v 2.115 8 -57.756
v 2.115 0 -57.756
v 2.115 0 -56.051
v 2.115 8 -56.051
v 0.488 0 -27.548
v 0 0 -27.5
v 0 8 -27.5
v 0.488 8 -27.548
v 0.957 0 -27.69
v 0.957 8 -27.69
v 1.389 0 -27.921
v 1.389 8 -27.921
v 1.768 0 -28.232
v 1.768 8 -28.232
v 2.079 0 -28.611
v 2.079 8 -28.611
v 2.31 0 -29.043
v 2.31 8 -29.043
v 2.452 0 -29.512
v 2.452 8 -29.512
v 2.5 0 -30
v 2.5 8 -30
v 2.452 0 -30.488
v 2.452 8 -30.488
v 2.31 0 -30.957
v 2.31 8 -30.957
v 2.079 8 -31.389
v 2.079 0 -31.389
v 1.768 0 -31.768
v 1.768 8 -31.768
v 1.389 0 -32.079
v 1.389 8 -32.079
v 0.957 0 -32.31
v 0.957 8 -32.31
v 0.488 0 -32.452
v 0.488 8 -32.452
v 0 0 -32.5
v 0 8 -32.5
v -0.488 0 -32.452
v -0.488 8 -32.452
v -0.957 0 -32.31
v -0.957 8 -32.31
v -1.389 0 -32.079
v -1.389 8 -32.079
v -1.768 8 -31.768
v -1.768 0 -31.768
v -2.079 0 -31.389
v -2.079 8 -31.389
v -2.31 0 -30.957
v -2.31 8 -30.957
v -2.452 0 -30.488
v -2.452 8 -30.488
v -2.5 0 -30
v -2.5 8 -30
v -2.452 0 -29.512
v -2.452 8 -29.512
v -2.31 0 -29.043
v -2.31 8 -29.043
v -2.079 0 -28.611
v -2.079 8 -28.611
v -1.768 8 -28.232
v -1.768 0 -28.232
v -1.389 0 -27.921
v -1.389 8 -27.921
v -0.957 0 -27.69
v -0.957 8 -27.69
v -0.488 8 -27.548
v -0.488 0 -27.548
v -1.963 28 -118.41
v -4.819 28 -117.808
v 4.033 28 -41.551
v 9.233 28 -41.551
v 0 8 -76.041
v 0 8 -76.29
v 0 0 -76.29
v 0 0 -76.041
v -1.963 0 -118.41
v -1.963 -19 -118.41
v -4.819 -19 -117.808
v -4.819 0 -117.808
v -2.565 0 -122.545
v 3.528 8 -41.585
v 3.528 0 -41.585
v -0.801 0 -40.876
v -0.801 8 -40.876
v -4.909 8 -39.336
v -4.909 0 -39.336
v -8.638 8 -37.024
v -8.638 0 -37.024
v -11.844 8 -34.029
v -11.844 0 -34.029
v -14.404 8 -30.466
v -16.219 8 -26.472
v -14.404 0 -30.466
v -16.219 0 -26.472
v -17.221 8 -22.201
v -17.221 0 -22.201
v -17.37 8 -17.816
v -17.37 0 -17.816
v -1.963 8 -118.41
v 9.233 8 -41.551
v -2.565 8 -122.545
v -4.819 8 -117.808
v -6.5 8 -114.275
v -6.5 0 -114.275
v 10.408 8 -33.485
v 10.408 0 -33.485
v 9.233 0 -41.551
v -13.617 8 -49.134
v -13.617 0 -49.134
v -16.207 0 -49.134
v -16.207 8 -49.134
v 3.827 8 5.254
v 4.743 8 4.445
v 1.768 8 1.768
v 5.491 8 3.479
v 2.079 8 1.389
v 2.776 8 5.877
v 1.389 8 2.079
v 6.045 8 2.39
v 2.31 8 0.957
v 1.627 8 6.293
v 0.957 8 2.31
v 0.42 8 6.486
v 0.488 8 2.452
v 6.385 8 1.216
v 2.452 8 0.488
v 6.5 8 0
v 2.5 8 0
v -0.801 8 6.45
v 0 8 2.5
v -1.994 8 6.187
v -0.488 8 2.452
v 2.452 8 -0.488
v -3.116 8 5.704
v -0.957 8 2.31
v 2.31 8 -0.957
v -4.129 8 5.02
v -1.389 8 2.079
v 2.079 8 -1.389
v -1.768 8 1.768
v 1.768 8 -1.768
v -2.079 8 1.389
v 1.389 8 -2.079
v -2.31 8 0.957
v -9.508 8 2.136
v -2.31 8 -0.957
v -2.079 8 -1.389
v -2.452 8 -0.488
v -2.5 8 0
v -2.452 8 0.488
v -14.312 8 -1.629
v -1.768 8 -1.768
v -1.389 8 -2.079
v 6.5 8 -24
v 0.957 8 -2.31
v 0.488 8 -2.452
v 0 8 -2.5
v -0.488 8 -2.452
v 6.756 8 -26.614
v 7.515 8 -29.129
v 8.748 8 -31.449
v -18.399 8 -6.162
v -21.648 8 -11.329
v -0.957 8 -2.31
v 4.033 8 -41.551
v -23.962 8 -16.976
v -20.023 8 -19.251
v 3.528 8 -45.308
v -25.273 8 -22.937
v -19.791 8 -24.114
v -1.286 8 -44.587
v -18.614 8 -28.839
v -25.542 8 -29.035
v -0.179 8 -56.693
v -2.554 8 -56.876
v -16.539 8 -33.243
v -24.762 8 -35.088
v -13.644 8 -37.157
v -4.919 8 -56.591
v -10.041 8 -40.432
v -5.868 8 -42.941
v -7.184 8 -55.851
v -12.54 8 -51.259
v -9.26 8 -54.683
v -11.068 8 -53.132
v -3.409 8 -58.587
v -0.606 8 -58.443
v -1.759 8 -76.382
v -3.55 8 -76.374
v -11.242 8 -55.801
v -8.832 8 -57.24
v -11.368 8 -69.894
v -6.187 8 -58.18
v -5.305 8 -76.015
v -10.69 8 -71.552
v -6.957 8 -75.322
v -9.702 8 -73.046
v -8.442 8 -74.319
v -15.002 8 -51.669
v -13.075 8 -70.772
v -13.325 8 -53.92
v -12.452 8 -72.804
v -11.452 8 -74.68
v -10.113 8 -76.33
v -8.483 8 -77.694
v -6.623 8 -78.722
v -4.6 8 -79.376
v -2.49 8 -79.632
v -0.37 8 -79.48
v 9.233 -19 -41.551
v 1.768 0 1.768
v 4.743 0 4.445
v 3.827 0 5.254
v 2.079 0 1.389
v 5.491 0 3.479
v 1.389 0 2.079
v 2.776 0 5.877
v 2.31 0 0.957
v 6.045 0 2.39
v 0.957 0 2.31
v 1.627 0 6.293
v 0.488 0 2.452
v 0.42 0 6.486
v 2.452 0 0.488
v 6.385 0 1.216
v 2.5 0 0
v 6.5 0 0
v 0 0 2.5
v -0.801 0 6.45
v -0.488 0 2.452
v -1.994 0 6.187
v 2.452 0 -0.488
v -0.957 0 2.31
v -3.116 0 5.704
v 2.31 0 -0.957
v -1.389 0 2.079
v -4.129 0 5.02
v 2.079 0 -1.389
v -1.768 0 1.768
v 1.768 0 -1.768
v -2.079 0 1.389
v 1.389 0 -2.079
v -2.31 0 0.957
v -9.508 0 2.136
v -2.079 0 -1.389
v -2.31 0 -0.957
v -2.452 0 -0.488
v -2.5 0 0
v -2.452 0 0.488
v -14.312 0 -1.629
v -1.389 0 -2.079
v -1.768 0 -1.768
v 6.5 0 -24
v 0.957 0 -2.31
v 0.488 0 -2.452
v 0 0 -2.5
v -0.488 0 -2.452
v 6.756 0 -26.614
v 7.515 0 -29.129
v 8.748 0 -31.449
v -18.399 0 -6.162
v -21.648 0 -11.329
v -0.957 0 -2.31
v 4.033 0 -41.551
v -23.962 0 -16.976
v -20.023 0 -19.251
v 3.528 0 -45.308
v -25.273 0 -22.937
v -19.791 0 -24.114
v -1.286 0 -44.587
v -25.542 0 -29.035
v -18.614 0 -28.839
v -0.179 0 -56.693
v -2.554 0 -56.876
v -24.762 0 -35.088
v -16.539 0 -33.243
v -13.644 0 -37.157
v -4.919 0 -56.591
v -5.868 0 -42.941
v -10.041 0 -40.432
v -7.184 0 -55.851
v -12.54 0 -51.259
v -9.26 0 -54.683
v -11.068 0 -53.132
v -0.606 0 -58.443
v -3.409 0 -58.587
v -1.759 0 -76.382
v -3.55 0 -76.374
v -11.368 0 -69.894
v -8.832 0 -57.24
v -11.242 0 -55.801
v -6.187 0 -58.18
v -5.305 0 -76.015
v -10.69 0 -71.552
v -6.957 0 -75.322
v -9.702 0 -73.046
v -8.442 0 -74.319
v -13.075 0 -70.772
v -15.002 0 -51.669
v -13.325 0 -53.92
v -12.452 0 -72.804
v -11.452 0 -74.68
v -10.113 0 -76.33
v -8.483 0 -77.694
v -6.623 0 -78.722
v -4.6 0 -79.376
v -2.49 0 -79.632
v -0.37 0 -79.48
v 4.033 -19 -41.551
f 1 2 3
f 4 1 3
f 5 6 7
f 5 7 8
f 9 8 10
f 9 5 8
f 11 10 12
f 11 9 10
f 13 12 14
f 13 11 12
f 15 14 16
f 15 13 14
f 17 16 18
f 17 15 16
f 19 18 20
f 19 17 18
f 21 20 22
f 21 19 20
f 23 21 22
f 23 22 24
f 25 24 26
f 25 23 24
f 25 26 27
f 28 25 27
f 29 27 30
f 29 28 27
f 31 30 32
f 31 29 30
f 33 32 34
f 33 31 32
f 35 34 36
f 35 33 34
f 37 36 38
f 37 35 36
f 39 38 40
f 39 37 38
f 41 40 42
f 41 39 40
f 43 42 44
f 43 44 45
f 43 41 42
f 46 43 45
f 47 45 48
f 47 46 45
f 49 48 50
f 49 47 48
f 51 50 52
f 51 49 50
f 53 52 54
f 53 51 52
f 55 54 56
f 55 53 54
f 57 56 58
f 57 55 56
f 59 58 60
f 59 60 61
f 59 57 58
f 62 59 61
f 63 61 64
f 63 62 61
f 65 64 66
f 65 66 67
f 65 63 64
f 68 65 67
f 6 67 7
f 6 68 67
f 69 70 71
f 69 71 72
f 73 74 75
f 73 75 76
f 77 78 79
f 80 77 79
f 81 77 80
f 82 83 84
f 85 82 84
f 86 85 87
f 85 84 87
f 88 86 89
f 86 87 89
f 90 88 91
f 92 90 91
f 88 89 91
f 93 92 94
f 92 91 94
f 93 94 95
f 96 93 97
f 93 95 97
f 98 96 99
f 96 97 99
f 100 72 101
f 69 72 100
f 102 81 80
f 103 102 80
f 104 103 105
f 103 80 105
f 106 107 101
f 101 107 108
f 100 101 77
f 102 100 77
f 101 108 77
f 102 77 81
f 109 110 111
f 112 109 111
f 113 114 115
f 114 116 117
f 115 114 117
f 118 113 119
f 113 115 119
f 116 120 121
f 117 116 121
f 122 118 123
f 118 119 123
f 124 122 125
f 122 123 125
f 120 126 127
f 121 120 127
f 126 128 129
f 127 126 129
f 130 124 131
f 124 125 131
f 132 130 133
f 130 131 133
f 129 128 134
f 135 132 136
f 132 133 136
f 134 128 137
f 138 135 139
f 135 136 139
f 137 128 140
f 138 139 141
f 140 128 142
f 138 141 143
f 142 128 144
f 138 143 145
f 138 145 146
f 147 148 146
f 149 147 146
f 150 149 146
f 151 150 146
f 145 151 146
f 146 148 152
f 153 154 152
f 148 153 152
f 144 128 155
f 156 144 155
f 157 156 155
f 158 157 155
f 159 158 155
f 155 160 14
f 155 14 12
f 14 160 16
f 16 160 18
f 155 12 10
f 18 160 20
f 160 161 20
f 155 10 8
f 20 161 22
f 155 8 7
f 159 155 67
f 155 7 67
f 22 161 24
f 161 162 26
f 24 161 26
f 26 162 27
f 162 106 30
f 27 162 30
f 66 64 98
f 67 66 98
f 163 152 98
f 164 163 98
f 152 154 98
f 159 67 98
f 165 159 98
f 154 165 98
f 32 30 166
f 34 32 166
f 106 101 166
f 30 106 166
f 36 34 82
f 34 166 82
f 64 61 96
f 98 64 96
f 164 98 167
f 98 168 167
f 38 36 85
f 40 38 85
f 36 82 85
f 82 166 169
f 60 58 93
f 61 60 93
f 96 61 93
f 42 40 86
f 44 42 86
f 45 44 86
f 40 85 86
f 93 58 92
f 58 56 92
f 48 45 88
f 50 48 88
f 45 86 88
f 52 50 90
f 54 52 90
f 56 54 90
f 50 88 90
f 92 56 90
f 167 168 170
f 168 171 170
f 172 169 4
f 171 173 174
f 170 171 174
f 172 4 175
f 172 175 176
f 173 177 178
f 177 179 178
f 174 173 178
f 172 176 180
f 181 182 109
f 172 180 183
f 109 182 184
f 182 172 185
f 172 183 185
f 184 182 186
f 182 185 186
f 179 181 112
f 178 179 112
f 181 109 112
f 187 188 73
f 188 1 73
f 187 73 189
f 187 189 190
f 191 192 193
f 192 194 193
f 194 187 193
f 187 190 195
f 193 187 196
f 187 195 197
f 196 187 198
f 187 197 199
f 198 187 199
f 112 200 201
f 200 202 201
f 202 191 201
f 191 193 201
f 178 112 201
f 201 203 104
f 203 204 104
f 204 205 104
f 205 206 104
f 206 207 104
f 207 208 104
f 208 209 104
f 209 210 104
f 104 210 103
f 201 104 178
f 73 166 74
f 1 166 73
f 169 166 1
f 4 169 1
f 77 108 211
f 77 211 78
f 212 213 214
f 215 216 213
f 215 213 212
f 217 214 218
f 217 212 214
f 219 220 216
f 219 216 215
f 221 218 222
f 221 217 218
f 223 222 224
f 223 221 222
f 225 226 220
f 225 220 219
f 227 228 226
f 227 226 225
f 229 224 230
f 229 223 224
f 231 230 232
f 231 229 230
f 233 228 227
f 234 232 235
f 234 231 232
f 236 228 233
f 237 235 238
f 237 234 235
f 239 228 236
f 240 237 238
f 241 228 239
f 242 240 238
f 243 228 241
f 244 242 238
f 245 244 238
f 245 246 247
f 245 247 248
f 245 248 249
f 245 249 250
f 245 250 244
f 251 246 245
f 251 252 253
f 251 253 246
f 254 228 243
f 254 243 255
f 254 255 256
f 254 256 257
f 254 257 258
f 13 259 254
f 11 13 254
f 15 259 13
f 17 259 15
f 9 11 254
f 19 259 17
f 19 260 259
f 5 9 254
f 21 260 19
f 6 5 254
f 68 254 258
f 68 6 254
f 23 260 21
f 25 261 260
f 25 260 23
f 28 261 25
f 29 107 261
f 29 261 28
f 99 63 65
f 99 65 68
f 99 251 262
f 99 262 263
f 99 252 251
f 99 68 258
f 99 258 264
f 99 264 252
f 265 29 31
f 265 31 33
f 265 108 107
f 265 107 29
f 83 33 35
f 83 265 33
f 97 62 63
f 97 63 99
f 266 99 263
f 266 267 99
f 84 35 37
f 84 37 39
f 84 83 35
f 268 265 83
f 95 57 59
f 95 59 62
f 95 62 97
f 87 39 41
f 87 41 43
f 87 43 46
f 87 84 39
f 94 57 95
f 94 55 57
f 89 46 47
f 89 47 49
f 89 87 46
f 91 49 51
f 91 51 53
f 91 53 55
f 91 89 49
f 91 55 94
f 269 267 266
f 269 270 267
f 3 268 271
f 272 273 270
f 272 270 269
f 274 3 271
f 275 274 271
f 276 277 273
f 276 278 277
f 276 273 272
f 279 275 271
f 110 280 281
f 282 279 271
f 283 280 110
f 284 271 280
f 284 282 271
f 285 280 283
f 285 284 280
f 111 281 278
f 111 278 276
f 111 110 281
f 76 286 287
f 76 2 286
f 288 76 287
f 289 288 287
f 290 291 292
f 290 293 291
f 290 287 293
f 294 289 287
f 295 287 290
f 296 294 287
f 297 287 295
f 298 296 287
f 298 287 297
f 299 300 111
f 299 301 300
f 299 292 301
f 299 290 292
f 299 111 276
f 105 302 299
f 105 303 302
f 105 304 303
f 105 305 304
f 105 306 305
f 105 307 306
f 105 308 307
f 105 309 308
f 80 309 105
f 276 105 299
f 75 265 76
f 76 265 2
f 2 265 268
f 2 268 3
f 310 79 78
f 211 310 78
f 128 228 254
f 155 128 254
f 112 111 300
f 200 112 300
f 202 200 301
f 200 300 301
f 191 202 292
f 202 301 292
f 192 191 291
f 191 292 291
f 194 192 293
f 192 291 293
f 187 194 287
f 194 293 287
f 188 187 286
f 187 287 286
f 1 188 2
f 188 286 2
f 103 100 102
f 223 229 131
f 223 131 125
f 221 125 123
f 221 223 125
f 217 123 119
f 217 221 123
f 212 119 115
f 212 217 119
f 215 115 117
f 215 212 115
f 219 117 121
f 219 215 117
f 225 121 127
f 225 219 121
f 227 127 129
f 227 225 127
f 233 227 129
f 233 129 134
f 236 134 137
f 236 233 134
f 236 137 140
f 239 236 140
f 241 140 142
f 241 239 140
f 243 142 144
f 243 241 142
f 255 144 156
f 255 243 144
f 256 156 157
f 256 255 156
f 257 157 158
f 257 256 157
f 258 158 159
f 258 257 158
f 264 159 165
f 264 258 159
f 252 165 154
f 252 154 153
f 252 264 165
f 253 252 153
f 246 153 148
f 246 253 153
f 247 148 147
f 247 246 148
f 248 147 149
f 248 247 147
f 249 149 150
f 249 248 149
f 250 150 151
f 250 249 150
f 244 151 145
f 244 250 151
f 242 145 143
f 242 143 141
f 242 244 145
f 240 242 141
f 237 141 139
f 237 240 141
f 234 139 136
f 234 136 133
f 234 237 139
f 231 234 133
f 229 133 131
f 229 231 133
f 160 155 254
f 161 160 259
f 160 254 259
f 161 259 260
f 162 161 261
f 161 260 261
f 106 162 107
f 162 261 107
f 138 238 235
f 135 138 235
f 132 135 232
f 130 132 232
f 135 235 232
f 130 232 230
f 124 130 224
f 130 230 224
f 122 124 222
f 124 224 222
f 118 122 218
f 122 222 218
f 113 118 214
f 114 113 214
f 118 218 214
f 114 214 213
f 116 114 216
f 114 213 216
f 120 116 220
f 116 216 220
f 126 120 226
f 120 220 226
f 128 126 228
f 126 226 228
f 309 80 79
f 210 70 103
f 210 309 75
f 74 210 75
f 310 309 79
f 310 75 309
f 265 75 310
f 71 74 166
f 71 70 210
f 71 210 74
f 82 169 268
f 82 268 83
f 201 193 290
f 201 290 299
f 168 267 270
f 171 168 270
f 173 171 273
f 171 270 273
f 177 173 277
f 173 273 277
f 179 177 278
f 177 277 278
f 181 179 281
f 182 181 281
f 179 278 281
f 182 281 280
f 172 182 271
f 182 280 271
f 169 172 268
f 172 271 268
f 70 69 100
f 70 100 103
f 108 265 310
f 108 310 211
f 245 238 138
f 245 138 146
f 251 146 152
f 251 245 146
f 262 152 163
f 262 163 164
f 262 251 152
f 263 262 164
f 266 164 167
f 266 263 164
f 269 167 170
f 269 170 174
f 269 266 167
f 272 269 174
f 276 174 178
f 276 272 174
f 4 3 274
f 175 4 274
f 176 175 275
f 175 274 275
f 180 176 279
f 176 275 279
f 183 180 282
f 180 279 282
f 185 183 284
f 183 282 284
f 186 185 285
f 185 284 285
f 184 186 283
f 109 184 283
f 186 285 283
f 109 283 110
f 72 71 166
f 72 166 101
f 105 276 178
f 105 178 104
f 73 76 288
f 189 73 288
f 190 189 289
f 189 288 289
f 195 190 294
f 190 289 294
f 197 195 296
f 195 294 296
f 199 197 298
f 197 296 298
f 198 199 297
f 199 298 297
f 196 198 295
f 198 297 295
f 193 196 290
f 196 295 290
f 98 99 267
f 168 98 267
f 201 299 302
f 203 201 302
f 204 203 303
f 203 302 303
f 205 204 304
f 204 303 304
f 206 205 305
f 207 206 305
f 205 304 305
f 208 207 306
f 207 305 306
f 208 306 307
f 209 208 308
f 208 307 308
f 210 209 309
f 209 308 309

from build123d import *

# Parameters (mm, degrees)
CROQUIS2_R               = 2.5
SALIENTE_EXTRUIR1_DEPTH  = 8
BOSS_EXTRUDE1_DEPTH      = 8
CUT_EXTRUDE1_DEPTH       = 8
CUT_EXTRUDE2_DEPTH       = 8
CUT_EXTRUDE3_DEPTH       = 8
BOSS_EXTRUDE2_DEPTH      = 19
BOSS_EXTRUDE2_DEPTH_BACK = 28


with BuildPart() as part:
    # Croquis2 → Saliente-Extruir1 (new body)
    with BuildSketch(Plane(origin=(0, 0, 0), x_dir=(1, 0, 0), z_dir=(0, 1, 0))):
        with BuildLine():
            Line((10.408146681, 33.484891271), (-2.565348209, 122.544918389))
            Line((-2.565348209, 122.544918389), (-6.5, 114.275467894))
            Line((-6.5, 114.275467894), (-6.5, 70))
            Line((-6.5, 70), (-6.5, 0))
            ThreePointArc((-6.5, 0), (0, -6.5), (6.5, 0))
            Line((6.5, 0), (6.5, 24))
            ThreePointArc((6.5, 24), (7.515319953, 29.129248797), (10.408146681, 33.484891271))
        make_face()
        with Locations(Location((0, 0, 0), (0, 0, 270))):
            Circle(CROQUIS2_R, mode=Mode.SUBTRACT)
        with Locations(Location((0, 30, 0), (0, 0, 270))):
            Circle(CROQUIS2_R, mode=Mode.SUBTRACT)
    extrude(amount=SALIENTE_EXTRUIR1_DEPTH)

    # Sketch1 → Boss-Extrude1 (add)
    with BuildSketch(Plane(origin=(0, 0, 0), x_dir=(-1, 0, 0), z_dir=(0, -1, 0))):
        with BuildLine():
            ThreePointArc((4.128942059, -5.020143173), (21.647746033, 11.328640903), (24.761644954, 35.087741621))
            Line((24.761644954, 35.087741621), (6.5, 114.275467894))
            Line((6.5, 114.275467894), (6.5, 0))
            ThreePointArc((6.5, 0), (6.46955751, -0.628351518), (6.378515191, -1.250817318))
            ThreePointArc((6.378515191, -1.250817318), (5.581542691, -3.331123112), (4.128942059, -5.020143173))
        make_face()
    extrude(amount=-BOSS_EXTRUDE1_DEPTH)

    # Sketch2 → Cut-Extrude1 (cut)
    with BuildSketch(Plane(origin=(0, 0, 0), x_dir=(-1, 0, 0), z_dir=(0, -1, 0))):
        with BuildLine():
            Line((17.370234703, 17.816064827), (20.022873599, 19.251371951))
            ThreePointArc((20.022873599, 19.251371951), (13.643712801, 37.157358361), (-3.528479472, 45.308054917))
            Line((-3.528479472, 45.308054917), (-3.528479472, 41.585393249))
            ThreePointArc((-3.528479472, 41.585393249), (11.843666716, 34.028994462), (17.370234703, 17.816064827))
        make_face()
    extrude(amount=-CUT_EXTRUDE1_DEPTH, mode=Mode.SUBTRACT)

    # Sketch3 → Cut-Extrude2 (cut)
    with BuildSketch(Plane(origin=(0, 0, 0), x_dir=(-1, 0, 0), z_dir=(0, -1, 0))):
        with BuildLine():
            Line((13.617187508, 49.133891817), (16.20693955, 49.133891817))
            ThreePointArc((16.20693955, 49.133891817), (8.831529271, 57.239594637), (-2.115270782, 57.755989445))
            Line((-2.115270782, 57.755989445), (-2.115270782, 56.050896345))
            ThreePointArc((-2.115270782, 56.050896345), (7.183516906, 55.850692877), (13.617187508, 49.133891817))
        make_face()
    extrude(amount=-CUT_EXTRUDE2_DEPTH, mode=Mode.SUBTRACT)

    # Sketch4 → Cut-Extrude3 (cut)
    with BuildSketch(Plane(origin=(0, 0, 0), x_dir=(-1, 0, 0), z_dir=(0, -1, 0))):
        with BuildLine():
            Line((11.367603777, 69.893539148), (13.075452067, 70.772160082))
            ThreePointArc((13.075452067, 70.772160082), (8.326822135, 77.799434944), (0, 79.410680226))
            Line((0, 79.410680226), (0, 76.04148357))
            ThreePointArc((0, 76.04148357), (6.957082869, 75.321819187), (11.367603777, 69.893539148))
        make_face()
    extrude(amount=-CUT_EXTRUDE3_DEPTH, mode=Mode.SUBTRACT)

    # Sketch5 → Boss-Extrude2 (add, two sides: drawn at the far end of the back side and taken through both)
    with BuildSketch(Plane(origin=(0, 0, 0), x_dir=(-1, 0, 0), z_dir=(0, -1, 0)).offset(-BOSS_EXTRUDE2_DEPTH_BACK)):
        Polygon((-9.233196645, 41.550650182), (1.963037177, 118.410193142), (4.819417727, 117.807544593), (-4.03262502, 41.550650182), align=None)
    extrude(amount=BOSS_EXTRUDE2_DEPTH + BOSS_EXTRUDE2_DEPTH_BACK)


solid = part.part
